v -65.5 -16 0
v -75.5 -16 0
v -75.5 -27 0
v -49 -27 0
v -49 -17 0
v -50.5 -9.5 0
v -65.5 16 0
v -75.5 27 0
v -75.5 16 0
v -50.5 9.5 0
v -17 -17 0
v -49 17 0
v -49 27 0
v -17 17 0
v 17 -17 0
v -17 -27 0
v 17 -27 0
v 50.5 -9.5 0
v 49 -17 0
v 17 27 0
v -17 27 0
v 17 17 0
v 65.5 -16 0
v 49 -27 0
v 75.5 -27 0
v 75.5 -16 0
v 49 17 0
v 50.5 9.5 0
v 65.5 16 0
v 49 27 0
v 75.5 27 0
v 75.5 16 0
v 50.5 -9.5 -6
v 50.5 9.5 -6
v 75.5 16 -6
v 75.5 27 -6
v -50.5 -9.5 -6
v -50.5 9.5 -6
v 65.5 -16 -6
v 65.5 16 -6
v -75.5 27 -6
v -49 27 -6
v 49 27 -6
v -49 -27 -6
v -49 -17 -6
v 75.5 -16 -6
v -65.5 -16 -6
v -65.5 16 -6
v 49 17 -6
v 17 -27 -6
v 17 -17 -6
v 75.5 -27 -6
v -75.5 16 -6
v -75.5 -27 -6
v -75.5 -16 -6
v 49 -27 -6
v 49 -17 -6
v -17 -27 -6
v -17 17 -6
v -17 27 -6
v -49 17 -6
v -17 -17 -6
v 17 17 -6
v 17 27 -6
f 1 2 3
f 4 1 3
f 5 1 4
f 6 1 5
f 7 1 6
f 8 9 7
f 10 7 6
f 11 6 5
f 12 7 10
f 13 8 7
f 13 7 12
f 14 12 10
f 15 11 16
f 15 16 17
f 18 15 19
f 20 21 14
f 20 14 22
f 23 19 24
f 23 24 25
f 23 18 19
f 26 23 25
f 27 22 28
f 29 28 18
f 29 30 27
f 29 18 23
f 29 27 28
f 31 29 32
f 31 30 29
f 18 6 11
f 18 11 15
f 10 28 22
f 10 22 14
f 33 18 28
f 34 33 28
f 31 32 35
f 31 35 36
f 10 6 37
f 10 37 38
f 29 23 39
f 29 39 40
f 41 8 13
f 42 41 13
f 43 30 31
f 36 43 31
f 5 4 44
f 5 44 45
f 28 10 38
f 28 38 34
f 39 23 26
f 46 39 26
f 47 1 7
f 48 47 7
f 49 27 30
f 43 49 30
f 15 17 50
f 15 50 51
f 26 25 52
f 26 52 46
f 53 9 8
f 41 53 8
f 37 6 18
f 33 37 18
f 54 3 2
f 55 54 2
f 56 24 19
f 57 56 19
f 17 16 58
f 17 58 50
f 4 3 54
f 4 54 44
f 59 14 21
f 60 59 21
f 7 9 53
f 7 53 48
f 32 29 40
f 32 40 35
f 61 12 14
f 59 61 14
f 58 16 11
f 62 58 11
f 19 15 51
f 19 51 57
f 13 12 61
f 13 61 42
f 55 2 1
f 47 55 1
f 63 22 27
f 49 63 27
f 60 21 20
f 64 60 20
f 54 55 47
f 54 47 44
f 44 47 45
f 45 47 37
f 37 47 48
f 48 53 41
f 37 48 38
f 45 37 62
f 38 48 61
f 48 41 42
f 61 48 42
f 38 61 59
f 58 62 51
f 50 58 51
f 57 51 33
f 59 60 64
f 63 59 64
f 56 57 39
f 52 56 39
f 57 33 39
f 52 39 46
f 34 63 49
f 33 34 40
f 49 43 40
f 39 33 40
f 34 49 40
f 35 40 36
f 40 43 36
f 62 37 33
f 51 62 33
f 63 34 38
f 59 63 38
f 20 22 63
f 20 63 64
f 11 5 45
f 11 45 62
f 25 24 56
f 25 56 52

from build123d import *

# Parameters (mm, degrees)
ESQUISSE1_W             = 151
ESQUISSE1_H             = 54
ESQUISSE1_W_2           = 101
ESQUISSE1_H_2           = 19
BOSS_EXTRU_1_DEPTH      = 6
ESQUISSE2_W             = 10
ESQUISSE2_H             = 32
ENL_V_MAT_EXTRU_1_DEPTH = 6
ESQUISSE4_W             = 32
ESQUISSE4_H             = 10
ENL_V_MAT_EXTRU_2_DEPTH = 10


with BuildPart() as part:
    # Esquisse1 → Boss.-Extru.1 (new body)
    with BuildSketch(Plane.XY):
        Rectangle(ESQUISSE1_W, ESQUISSE1_H)
        Rectangle(ESQUISSE1_W_2, ESQUISSE1_H_2, mode=Mode.SUBTRACT)
    extrude(amount=-BOSS_EXTRU_1_DEPTH)

    # Esquisse2 → Enlèv. mat.-Extru.1 (cut)
    with BuildSketch(Plane.XY):
        with Locations((-70.5, 0)):
            Rectangle(ESQUISSE2_W, ESQUISSE2_H)
        with Locations((70.5, 0)):
            Rectangle(ESQUISSE2_W, ESQUISSE2_H)
    extrude(amount=-ENL_V_MAT_EXTRU_1_DEPTH, mode=Mode.SUBTRACT)

    # Esquisse4 → Enlèv. mat.-Extru.2 (cut)
    with BuildSketch(Plane.XY):
        with Locations((33, 22)):
            Rectangle(ESQUISSE4_W, ESQUISSE4_H)
        with Locations((-33, 22)):
            Rectangle(ESQUISSE4_W, ESQUISSE4_H)
        with Locations((-33, -22)):
            Rectangle(ESQUISSE4_W, ESQUISSE4_H)
        with Locations((33, -22)):
            Rectangle(ESQUISSE4_W, ESQUISSE4_H)
    extrude(amount=-ENL_V_MAT_EXTRU_2_DEPTH, mode=Mode.SUBTRACT)


solid = part.part
